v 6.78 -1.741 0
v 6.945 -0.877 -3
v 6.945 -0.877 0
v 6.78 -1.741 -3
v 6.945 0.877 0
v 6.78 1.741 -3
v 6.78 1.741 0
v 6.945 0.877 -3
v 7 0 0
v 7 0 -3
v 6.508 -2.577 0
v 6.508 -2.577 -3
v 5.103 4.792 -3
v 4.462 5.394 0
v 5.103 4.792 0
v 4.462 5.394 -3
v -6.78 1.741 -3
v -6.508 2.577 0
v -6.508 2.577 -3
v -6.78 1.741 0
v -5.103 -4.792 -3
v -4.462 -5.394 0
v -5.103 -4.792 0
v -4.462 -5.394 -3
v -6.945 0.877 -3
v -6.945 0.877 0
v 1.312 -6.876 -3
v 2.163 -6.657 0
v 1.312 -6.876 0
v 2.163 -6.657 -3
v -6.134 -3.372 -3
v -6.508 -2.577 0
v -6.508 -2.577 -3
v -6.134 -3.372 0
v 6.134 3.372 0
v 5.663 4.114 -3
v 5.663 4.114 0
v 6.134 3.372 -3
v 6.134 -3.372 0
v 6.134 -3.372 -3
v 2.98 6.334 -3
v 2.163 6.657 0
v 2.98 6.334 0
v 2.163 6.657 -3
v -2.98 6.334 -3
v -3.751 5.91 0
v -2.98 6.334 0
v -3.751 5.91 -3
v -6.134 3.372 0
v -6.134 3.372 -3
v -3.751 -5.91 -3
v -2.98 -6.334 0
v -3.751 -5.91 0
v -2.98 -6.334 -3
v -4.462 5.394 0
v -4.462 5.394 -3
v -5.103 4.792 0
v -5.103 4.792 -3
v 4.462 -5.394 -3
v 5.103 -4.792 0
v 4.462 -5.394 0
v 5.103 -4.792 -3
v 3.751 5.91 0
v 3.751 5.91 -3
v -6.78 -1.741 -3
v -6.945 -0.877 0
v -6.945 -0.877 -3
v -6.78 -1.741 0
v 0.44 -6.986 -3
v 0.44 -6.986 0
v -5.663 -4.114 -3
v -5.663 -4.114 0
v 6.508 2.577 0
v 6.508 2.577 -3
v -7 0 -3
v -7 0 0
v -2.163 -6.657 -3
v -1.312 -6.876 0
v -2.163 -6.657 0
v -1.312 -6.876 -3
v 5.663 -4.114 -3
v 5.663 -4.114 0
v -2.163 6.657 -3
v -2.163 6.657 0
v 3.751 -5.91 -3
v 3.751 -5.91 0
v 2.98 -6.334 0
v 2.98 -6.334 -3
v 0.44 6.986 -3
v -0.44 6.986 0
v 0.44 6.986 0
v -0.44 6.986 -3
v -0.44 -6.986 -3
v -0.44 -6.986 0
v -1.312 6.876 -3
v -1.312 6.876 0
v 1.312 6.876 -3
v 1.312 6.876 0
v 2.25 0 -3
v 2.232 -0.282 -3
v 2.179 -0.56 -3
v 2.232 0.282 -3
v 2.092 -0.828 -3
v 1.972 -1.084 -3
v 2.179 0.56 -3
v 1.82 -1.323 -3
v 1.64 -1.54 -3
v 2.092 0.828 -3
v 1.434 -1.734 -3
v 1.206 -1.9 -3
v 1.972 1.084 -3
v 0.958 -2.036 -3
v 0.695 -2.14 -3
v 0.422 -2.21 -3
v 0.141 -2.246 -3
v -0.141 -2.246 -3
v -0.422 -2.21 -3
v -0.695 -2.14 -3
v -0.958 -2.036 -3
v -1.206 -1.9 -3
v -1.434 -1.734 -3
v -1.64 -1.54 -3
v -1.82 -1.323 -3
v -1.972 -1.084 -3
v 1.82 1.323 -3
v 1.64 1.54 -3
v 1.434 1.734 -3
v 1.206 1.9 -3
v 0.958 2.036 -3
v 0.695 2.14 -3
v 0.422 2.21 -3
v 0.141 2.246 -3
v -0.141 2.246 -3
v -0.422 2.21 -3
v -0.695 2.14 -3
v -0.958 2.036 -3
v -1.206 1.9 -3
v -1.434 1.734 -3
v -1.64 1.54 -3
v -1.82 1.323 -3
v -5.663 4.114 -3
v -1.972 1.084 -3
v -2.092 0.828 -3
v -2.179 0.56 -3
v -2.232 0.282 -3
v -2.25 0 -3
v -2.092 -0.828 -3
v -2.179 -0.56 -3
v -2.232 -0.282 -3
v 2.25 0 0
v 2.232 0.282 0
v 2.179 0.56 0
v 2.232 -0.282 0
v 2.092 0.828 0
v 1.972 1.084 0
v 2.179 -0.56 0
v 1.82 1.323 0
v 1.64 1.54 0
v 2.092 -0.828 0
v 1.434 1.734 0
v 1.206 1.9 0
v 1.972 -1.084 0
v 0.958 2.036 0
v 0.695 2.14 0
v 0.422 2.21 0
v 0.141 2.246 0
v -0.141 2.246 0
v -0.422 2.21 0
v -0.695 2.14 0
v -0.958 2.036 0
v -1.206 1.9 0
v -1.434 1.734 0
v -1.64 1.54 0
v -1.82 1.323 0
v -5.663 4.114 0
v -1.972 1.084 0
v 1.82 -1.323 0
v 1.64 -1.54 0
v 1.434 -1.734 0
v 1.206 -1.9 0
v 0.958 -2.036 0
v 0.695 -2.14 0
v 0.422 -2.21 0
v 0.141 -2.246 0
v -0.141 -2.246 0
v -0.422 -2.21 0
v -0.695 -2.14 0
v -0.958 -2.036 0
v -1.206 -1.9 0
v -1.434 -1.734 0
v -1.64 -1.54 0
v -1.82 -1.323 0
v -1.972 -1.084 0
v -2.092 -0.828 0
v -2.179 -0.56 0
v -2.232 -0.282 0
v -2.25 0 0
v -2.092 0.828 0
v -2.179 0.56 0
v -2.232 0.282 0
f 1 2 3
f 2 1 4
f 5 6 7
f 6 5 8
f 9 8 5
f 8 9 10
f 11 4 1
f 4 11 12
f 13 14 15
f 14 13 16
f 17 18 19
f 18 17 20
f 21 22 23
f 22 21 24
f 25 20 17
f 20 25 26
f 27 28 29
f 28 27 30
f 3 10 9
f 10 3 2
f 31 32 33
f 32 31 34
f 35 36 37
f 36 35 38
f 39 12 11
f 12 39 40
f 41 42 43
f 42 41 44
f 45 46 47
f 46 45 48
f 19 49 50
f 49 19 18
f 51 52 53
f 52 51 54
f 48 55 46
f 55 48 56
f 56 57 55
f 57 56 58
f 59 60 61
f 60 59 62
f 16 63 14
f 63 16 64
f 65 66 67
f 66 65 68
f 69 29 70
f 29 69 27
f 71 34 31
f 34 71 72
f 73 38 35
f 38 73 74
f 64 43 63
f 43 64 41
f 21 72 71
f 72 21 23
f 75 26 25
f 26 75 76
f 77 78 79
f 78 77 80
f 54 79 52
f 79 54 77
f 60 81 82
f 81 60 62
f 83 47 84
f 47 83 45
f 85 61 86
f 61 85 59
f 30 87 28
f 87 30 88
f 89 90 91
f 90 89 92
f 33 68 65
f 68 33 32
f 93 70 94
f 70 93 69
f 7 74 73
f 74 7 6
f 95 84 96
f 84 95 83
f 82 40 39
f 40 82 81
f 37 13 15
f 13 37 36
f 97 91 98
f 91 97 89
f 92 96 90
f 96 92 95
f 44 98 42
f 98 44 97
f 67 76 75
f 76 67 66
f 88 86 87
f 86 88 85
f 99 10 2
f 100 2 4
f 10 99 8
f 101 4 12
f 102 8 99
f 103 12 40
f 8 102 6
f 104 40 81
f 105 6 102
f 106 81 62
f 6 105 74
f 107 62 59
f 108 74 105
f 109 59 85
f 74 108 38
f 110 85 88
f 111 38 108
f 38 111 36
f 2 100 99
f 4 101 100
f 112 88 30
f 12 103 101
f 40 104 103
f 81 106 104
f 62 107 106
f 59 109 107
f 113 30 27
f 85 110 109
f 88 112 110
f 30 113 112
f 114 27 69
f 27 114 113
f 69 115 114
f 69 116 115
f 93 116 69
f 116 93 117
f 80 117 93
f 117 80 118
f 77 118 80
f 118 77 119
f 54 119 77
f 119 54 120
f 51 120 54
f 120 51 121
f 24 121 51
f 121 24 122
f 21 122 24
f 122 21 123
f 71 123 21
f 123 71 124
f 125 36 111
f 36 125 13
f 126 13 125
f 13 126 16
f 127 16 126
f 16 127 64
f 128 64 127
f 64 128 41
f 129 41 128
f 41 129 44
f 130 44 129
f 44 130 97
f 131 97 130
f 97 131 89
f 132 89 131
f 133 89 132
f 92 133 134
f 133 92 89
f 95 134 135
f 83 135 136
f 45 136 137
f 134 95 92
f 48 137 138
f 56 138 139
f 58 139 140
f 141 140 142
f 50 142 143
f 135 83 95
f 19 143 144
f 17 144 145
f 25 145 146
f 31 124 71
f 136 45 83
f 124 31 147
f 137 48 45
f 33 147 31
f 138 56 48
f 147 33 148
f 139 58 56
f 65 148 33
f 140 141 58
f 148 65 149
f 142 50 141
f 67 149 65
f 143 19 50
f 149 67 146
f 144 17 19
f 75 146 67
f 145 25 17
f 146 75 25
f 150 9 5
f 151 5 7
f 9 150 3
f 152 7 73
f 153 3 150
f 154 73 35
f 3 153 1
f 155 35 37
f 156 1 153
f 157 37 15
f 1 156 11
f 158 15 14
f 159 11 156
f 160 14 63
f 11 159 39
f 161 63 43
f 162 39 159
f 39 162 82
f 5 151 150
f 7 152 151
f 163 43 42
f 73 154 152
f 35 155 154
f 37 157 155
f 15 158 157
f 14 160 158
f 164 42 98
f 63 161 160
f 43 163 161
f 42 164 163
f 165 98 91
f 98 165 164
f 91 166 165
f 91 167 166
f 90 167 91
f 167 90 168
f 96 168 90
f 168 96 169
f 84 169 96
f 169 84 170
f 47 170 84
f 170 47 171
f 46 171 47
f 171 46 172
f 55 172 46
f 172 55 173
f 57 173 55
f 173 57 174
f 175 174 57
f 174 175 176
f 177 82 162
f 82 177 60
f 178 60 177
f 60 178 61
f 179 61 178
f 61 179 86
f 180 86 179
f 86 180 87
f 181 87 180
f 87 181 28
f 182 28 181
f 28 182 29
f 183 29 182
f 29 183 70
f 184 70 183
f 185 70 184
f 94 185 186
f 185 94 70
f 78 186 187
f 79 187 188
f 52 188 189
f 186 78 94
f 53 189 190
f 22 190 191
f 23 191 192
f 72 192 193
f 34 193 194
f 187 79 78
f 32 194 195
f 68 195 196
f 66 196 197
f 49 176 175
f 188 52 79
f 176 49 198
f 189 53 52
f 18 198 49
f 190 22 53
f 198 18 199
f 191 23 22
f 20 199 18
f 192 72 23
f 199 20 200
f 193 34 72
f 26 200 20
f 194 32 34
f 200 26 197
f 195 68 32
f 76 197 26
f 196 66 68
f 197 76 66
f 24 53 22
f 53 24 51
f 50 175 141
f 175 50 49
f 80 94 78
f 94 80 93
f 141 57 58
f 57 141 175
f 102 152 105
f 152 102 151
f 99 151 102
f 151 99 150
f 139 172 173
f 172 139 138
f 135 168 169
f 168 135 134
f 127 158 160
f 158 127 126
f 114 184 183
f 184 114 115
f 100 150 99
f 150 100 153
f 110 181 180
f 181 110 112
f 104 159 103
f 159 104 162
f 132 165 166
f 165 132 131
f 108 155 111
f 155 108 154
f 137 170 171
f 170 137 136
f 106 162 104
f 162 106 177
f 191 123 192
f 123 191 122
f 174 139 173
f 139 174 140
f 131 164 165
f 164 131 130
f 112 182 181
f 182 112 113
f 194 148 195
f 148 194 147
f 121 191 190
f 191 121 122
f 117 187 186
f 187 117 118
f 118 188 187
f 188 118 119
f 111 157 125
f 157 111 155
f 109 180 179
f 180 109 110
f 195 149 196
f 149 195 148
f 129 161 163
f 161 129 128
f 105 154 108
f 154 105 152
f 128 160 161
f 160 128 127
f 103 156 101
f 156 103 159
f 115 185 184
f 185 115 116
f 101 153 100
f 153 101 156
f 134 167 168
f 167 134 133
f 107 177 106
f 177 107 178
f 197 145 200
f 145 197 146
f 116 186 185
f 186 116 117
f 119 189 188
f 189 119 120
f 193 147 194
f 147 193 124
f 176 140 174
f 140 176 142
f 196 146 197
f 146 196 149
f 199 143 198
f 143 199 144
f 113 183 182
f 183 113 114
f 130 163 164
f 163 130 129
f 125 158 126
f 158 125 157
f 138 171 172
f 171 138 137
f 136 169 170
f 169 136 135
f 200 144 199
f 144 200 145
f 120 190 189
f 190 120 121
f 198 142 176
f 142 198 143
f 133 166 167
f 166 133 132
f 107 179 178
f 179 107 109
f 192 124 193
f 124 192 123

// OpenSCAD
$fn = 50;


difference() {
	union() {
		translate(v = [0, 0, -3.0000000000]) {
			cylinder(h = 3, r = 7.0000000000);
		}
	}
	union() {
		#translate(v = [0, 0, -3]) {
			cylinder(h = 3, r = 2.2500000000);
		}
	}
}
